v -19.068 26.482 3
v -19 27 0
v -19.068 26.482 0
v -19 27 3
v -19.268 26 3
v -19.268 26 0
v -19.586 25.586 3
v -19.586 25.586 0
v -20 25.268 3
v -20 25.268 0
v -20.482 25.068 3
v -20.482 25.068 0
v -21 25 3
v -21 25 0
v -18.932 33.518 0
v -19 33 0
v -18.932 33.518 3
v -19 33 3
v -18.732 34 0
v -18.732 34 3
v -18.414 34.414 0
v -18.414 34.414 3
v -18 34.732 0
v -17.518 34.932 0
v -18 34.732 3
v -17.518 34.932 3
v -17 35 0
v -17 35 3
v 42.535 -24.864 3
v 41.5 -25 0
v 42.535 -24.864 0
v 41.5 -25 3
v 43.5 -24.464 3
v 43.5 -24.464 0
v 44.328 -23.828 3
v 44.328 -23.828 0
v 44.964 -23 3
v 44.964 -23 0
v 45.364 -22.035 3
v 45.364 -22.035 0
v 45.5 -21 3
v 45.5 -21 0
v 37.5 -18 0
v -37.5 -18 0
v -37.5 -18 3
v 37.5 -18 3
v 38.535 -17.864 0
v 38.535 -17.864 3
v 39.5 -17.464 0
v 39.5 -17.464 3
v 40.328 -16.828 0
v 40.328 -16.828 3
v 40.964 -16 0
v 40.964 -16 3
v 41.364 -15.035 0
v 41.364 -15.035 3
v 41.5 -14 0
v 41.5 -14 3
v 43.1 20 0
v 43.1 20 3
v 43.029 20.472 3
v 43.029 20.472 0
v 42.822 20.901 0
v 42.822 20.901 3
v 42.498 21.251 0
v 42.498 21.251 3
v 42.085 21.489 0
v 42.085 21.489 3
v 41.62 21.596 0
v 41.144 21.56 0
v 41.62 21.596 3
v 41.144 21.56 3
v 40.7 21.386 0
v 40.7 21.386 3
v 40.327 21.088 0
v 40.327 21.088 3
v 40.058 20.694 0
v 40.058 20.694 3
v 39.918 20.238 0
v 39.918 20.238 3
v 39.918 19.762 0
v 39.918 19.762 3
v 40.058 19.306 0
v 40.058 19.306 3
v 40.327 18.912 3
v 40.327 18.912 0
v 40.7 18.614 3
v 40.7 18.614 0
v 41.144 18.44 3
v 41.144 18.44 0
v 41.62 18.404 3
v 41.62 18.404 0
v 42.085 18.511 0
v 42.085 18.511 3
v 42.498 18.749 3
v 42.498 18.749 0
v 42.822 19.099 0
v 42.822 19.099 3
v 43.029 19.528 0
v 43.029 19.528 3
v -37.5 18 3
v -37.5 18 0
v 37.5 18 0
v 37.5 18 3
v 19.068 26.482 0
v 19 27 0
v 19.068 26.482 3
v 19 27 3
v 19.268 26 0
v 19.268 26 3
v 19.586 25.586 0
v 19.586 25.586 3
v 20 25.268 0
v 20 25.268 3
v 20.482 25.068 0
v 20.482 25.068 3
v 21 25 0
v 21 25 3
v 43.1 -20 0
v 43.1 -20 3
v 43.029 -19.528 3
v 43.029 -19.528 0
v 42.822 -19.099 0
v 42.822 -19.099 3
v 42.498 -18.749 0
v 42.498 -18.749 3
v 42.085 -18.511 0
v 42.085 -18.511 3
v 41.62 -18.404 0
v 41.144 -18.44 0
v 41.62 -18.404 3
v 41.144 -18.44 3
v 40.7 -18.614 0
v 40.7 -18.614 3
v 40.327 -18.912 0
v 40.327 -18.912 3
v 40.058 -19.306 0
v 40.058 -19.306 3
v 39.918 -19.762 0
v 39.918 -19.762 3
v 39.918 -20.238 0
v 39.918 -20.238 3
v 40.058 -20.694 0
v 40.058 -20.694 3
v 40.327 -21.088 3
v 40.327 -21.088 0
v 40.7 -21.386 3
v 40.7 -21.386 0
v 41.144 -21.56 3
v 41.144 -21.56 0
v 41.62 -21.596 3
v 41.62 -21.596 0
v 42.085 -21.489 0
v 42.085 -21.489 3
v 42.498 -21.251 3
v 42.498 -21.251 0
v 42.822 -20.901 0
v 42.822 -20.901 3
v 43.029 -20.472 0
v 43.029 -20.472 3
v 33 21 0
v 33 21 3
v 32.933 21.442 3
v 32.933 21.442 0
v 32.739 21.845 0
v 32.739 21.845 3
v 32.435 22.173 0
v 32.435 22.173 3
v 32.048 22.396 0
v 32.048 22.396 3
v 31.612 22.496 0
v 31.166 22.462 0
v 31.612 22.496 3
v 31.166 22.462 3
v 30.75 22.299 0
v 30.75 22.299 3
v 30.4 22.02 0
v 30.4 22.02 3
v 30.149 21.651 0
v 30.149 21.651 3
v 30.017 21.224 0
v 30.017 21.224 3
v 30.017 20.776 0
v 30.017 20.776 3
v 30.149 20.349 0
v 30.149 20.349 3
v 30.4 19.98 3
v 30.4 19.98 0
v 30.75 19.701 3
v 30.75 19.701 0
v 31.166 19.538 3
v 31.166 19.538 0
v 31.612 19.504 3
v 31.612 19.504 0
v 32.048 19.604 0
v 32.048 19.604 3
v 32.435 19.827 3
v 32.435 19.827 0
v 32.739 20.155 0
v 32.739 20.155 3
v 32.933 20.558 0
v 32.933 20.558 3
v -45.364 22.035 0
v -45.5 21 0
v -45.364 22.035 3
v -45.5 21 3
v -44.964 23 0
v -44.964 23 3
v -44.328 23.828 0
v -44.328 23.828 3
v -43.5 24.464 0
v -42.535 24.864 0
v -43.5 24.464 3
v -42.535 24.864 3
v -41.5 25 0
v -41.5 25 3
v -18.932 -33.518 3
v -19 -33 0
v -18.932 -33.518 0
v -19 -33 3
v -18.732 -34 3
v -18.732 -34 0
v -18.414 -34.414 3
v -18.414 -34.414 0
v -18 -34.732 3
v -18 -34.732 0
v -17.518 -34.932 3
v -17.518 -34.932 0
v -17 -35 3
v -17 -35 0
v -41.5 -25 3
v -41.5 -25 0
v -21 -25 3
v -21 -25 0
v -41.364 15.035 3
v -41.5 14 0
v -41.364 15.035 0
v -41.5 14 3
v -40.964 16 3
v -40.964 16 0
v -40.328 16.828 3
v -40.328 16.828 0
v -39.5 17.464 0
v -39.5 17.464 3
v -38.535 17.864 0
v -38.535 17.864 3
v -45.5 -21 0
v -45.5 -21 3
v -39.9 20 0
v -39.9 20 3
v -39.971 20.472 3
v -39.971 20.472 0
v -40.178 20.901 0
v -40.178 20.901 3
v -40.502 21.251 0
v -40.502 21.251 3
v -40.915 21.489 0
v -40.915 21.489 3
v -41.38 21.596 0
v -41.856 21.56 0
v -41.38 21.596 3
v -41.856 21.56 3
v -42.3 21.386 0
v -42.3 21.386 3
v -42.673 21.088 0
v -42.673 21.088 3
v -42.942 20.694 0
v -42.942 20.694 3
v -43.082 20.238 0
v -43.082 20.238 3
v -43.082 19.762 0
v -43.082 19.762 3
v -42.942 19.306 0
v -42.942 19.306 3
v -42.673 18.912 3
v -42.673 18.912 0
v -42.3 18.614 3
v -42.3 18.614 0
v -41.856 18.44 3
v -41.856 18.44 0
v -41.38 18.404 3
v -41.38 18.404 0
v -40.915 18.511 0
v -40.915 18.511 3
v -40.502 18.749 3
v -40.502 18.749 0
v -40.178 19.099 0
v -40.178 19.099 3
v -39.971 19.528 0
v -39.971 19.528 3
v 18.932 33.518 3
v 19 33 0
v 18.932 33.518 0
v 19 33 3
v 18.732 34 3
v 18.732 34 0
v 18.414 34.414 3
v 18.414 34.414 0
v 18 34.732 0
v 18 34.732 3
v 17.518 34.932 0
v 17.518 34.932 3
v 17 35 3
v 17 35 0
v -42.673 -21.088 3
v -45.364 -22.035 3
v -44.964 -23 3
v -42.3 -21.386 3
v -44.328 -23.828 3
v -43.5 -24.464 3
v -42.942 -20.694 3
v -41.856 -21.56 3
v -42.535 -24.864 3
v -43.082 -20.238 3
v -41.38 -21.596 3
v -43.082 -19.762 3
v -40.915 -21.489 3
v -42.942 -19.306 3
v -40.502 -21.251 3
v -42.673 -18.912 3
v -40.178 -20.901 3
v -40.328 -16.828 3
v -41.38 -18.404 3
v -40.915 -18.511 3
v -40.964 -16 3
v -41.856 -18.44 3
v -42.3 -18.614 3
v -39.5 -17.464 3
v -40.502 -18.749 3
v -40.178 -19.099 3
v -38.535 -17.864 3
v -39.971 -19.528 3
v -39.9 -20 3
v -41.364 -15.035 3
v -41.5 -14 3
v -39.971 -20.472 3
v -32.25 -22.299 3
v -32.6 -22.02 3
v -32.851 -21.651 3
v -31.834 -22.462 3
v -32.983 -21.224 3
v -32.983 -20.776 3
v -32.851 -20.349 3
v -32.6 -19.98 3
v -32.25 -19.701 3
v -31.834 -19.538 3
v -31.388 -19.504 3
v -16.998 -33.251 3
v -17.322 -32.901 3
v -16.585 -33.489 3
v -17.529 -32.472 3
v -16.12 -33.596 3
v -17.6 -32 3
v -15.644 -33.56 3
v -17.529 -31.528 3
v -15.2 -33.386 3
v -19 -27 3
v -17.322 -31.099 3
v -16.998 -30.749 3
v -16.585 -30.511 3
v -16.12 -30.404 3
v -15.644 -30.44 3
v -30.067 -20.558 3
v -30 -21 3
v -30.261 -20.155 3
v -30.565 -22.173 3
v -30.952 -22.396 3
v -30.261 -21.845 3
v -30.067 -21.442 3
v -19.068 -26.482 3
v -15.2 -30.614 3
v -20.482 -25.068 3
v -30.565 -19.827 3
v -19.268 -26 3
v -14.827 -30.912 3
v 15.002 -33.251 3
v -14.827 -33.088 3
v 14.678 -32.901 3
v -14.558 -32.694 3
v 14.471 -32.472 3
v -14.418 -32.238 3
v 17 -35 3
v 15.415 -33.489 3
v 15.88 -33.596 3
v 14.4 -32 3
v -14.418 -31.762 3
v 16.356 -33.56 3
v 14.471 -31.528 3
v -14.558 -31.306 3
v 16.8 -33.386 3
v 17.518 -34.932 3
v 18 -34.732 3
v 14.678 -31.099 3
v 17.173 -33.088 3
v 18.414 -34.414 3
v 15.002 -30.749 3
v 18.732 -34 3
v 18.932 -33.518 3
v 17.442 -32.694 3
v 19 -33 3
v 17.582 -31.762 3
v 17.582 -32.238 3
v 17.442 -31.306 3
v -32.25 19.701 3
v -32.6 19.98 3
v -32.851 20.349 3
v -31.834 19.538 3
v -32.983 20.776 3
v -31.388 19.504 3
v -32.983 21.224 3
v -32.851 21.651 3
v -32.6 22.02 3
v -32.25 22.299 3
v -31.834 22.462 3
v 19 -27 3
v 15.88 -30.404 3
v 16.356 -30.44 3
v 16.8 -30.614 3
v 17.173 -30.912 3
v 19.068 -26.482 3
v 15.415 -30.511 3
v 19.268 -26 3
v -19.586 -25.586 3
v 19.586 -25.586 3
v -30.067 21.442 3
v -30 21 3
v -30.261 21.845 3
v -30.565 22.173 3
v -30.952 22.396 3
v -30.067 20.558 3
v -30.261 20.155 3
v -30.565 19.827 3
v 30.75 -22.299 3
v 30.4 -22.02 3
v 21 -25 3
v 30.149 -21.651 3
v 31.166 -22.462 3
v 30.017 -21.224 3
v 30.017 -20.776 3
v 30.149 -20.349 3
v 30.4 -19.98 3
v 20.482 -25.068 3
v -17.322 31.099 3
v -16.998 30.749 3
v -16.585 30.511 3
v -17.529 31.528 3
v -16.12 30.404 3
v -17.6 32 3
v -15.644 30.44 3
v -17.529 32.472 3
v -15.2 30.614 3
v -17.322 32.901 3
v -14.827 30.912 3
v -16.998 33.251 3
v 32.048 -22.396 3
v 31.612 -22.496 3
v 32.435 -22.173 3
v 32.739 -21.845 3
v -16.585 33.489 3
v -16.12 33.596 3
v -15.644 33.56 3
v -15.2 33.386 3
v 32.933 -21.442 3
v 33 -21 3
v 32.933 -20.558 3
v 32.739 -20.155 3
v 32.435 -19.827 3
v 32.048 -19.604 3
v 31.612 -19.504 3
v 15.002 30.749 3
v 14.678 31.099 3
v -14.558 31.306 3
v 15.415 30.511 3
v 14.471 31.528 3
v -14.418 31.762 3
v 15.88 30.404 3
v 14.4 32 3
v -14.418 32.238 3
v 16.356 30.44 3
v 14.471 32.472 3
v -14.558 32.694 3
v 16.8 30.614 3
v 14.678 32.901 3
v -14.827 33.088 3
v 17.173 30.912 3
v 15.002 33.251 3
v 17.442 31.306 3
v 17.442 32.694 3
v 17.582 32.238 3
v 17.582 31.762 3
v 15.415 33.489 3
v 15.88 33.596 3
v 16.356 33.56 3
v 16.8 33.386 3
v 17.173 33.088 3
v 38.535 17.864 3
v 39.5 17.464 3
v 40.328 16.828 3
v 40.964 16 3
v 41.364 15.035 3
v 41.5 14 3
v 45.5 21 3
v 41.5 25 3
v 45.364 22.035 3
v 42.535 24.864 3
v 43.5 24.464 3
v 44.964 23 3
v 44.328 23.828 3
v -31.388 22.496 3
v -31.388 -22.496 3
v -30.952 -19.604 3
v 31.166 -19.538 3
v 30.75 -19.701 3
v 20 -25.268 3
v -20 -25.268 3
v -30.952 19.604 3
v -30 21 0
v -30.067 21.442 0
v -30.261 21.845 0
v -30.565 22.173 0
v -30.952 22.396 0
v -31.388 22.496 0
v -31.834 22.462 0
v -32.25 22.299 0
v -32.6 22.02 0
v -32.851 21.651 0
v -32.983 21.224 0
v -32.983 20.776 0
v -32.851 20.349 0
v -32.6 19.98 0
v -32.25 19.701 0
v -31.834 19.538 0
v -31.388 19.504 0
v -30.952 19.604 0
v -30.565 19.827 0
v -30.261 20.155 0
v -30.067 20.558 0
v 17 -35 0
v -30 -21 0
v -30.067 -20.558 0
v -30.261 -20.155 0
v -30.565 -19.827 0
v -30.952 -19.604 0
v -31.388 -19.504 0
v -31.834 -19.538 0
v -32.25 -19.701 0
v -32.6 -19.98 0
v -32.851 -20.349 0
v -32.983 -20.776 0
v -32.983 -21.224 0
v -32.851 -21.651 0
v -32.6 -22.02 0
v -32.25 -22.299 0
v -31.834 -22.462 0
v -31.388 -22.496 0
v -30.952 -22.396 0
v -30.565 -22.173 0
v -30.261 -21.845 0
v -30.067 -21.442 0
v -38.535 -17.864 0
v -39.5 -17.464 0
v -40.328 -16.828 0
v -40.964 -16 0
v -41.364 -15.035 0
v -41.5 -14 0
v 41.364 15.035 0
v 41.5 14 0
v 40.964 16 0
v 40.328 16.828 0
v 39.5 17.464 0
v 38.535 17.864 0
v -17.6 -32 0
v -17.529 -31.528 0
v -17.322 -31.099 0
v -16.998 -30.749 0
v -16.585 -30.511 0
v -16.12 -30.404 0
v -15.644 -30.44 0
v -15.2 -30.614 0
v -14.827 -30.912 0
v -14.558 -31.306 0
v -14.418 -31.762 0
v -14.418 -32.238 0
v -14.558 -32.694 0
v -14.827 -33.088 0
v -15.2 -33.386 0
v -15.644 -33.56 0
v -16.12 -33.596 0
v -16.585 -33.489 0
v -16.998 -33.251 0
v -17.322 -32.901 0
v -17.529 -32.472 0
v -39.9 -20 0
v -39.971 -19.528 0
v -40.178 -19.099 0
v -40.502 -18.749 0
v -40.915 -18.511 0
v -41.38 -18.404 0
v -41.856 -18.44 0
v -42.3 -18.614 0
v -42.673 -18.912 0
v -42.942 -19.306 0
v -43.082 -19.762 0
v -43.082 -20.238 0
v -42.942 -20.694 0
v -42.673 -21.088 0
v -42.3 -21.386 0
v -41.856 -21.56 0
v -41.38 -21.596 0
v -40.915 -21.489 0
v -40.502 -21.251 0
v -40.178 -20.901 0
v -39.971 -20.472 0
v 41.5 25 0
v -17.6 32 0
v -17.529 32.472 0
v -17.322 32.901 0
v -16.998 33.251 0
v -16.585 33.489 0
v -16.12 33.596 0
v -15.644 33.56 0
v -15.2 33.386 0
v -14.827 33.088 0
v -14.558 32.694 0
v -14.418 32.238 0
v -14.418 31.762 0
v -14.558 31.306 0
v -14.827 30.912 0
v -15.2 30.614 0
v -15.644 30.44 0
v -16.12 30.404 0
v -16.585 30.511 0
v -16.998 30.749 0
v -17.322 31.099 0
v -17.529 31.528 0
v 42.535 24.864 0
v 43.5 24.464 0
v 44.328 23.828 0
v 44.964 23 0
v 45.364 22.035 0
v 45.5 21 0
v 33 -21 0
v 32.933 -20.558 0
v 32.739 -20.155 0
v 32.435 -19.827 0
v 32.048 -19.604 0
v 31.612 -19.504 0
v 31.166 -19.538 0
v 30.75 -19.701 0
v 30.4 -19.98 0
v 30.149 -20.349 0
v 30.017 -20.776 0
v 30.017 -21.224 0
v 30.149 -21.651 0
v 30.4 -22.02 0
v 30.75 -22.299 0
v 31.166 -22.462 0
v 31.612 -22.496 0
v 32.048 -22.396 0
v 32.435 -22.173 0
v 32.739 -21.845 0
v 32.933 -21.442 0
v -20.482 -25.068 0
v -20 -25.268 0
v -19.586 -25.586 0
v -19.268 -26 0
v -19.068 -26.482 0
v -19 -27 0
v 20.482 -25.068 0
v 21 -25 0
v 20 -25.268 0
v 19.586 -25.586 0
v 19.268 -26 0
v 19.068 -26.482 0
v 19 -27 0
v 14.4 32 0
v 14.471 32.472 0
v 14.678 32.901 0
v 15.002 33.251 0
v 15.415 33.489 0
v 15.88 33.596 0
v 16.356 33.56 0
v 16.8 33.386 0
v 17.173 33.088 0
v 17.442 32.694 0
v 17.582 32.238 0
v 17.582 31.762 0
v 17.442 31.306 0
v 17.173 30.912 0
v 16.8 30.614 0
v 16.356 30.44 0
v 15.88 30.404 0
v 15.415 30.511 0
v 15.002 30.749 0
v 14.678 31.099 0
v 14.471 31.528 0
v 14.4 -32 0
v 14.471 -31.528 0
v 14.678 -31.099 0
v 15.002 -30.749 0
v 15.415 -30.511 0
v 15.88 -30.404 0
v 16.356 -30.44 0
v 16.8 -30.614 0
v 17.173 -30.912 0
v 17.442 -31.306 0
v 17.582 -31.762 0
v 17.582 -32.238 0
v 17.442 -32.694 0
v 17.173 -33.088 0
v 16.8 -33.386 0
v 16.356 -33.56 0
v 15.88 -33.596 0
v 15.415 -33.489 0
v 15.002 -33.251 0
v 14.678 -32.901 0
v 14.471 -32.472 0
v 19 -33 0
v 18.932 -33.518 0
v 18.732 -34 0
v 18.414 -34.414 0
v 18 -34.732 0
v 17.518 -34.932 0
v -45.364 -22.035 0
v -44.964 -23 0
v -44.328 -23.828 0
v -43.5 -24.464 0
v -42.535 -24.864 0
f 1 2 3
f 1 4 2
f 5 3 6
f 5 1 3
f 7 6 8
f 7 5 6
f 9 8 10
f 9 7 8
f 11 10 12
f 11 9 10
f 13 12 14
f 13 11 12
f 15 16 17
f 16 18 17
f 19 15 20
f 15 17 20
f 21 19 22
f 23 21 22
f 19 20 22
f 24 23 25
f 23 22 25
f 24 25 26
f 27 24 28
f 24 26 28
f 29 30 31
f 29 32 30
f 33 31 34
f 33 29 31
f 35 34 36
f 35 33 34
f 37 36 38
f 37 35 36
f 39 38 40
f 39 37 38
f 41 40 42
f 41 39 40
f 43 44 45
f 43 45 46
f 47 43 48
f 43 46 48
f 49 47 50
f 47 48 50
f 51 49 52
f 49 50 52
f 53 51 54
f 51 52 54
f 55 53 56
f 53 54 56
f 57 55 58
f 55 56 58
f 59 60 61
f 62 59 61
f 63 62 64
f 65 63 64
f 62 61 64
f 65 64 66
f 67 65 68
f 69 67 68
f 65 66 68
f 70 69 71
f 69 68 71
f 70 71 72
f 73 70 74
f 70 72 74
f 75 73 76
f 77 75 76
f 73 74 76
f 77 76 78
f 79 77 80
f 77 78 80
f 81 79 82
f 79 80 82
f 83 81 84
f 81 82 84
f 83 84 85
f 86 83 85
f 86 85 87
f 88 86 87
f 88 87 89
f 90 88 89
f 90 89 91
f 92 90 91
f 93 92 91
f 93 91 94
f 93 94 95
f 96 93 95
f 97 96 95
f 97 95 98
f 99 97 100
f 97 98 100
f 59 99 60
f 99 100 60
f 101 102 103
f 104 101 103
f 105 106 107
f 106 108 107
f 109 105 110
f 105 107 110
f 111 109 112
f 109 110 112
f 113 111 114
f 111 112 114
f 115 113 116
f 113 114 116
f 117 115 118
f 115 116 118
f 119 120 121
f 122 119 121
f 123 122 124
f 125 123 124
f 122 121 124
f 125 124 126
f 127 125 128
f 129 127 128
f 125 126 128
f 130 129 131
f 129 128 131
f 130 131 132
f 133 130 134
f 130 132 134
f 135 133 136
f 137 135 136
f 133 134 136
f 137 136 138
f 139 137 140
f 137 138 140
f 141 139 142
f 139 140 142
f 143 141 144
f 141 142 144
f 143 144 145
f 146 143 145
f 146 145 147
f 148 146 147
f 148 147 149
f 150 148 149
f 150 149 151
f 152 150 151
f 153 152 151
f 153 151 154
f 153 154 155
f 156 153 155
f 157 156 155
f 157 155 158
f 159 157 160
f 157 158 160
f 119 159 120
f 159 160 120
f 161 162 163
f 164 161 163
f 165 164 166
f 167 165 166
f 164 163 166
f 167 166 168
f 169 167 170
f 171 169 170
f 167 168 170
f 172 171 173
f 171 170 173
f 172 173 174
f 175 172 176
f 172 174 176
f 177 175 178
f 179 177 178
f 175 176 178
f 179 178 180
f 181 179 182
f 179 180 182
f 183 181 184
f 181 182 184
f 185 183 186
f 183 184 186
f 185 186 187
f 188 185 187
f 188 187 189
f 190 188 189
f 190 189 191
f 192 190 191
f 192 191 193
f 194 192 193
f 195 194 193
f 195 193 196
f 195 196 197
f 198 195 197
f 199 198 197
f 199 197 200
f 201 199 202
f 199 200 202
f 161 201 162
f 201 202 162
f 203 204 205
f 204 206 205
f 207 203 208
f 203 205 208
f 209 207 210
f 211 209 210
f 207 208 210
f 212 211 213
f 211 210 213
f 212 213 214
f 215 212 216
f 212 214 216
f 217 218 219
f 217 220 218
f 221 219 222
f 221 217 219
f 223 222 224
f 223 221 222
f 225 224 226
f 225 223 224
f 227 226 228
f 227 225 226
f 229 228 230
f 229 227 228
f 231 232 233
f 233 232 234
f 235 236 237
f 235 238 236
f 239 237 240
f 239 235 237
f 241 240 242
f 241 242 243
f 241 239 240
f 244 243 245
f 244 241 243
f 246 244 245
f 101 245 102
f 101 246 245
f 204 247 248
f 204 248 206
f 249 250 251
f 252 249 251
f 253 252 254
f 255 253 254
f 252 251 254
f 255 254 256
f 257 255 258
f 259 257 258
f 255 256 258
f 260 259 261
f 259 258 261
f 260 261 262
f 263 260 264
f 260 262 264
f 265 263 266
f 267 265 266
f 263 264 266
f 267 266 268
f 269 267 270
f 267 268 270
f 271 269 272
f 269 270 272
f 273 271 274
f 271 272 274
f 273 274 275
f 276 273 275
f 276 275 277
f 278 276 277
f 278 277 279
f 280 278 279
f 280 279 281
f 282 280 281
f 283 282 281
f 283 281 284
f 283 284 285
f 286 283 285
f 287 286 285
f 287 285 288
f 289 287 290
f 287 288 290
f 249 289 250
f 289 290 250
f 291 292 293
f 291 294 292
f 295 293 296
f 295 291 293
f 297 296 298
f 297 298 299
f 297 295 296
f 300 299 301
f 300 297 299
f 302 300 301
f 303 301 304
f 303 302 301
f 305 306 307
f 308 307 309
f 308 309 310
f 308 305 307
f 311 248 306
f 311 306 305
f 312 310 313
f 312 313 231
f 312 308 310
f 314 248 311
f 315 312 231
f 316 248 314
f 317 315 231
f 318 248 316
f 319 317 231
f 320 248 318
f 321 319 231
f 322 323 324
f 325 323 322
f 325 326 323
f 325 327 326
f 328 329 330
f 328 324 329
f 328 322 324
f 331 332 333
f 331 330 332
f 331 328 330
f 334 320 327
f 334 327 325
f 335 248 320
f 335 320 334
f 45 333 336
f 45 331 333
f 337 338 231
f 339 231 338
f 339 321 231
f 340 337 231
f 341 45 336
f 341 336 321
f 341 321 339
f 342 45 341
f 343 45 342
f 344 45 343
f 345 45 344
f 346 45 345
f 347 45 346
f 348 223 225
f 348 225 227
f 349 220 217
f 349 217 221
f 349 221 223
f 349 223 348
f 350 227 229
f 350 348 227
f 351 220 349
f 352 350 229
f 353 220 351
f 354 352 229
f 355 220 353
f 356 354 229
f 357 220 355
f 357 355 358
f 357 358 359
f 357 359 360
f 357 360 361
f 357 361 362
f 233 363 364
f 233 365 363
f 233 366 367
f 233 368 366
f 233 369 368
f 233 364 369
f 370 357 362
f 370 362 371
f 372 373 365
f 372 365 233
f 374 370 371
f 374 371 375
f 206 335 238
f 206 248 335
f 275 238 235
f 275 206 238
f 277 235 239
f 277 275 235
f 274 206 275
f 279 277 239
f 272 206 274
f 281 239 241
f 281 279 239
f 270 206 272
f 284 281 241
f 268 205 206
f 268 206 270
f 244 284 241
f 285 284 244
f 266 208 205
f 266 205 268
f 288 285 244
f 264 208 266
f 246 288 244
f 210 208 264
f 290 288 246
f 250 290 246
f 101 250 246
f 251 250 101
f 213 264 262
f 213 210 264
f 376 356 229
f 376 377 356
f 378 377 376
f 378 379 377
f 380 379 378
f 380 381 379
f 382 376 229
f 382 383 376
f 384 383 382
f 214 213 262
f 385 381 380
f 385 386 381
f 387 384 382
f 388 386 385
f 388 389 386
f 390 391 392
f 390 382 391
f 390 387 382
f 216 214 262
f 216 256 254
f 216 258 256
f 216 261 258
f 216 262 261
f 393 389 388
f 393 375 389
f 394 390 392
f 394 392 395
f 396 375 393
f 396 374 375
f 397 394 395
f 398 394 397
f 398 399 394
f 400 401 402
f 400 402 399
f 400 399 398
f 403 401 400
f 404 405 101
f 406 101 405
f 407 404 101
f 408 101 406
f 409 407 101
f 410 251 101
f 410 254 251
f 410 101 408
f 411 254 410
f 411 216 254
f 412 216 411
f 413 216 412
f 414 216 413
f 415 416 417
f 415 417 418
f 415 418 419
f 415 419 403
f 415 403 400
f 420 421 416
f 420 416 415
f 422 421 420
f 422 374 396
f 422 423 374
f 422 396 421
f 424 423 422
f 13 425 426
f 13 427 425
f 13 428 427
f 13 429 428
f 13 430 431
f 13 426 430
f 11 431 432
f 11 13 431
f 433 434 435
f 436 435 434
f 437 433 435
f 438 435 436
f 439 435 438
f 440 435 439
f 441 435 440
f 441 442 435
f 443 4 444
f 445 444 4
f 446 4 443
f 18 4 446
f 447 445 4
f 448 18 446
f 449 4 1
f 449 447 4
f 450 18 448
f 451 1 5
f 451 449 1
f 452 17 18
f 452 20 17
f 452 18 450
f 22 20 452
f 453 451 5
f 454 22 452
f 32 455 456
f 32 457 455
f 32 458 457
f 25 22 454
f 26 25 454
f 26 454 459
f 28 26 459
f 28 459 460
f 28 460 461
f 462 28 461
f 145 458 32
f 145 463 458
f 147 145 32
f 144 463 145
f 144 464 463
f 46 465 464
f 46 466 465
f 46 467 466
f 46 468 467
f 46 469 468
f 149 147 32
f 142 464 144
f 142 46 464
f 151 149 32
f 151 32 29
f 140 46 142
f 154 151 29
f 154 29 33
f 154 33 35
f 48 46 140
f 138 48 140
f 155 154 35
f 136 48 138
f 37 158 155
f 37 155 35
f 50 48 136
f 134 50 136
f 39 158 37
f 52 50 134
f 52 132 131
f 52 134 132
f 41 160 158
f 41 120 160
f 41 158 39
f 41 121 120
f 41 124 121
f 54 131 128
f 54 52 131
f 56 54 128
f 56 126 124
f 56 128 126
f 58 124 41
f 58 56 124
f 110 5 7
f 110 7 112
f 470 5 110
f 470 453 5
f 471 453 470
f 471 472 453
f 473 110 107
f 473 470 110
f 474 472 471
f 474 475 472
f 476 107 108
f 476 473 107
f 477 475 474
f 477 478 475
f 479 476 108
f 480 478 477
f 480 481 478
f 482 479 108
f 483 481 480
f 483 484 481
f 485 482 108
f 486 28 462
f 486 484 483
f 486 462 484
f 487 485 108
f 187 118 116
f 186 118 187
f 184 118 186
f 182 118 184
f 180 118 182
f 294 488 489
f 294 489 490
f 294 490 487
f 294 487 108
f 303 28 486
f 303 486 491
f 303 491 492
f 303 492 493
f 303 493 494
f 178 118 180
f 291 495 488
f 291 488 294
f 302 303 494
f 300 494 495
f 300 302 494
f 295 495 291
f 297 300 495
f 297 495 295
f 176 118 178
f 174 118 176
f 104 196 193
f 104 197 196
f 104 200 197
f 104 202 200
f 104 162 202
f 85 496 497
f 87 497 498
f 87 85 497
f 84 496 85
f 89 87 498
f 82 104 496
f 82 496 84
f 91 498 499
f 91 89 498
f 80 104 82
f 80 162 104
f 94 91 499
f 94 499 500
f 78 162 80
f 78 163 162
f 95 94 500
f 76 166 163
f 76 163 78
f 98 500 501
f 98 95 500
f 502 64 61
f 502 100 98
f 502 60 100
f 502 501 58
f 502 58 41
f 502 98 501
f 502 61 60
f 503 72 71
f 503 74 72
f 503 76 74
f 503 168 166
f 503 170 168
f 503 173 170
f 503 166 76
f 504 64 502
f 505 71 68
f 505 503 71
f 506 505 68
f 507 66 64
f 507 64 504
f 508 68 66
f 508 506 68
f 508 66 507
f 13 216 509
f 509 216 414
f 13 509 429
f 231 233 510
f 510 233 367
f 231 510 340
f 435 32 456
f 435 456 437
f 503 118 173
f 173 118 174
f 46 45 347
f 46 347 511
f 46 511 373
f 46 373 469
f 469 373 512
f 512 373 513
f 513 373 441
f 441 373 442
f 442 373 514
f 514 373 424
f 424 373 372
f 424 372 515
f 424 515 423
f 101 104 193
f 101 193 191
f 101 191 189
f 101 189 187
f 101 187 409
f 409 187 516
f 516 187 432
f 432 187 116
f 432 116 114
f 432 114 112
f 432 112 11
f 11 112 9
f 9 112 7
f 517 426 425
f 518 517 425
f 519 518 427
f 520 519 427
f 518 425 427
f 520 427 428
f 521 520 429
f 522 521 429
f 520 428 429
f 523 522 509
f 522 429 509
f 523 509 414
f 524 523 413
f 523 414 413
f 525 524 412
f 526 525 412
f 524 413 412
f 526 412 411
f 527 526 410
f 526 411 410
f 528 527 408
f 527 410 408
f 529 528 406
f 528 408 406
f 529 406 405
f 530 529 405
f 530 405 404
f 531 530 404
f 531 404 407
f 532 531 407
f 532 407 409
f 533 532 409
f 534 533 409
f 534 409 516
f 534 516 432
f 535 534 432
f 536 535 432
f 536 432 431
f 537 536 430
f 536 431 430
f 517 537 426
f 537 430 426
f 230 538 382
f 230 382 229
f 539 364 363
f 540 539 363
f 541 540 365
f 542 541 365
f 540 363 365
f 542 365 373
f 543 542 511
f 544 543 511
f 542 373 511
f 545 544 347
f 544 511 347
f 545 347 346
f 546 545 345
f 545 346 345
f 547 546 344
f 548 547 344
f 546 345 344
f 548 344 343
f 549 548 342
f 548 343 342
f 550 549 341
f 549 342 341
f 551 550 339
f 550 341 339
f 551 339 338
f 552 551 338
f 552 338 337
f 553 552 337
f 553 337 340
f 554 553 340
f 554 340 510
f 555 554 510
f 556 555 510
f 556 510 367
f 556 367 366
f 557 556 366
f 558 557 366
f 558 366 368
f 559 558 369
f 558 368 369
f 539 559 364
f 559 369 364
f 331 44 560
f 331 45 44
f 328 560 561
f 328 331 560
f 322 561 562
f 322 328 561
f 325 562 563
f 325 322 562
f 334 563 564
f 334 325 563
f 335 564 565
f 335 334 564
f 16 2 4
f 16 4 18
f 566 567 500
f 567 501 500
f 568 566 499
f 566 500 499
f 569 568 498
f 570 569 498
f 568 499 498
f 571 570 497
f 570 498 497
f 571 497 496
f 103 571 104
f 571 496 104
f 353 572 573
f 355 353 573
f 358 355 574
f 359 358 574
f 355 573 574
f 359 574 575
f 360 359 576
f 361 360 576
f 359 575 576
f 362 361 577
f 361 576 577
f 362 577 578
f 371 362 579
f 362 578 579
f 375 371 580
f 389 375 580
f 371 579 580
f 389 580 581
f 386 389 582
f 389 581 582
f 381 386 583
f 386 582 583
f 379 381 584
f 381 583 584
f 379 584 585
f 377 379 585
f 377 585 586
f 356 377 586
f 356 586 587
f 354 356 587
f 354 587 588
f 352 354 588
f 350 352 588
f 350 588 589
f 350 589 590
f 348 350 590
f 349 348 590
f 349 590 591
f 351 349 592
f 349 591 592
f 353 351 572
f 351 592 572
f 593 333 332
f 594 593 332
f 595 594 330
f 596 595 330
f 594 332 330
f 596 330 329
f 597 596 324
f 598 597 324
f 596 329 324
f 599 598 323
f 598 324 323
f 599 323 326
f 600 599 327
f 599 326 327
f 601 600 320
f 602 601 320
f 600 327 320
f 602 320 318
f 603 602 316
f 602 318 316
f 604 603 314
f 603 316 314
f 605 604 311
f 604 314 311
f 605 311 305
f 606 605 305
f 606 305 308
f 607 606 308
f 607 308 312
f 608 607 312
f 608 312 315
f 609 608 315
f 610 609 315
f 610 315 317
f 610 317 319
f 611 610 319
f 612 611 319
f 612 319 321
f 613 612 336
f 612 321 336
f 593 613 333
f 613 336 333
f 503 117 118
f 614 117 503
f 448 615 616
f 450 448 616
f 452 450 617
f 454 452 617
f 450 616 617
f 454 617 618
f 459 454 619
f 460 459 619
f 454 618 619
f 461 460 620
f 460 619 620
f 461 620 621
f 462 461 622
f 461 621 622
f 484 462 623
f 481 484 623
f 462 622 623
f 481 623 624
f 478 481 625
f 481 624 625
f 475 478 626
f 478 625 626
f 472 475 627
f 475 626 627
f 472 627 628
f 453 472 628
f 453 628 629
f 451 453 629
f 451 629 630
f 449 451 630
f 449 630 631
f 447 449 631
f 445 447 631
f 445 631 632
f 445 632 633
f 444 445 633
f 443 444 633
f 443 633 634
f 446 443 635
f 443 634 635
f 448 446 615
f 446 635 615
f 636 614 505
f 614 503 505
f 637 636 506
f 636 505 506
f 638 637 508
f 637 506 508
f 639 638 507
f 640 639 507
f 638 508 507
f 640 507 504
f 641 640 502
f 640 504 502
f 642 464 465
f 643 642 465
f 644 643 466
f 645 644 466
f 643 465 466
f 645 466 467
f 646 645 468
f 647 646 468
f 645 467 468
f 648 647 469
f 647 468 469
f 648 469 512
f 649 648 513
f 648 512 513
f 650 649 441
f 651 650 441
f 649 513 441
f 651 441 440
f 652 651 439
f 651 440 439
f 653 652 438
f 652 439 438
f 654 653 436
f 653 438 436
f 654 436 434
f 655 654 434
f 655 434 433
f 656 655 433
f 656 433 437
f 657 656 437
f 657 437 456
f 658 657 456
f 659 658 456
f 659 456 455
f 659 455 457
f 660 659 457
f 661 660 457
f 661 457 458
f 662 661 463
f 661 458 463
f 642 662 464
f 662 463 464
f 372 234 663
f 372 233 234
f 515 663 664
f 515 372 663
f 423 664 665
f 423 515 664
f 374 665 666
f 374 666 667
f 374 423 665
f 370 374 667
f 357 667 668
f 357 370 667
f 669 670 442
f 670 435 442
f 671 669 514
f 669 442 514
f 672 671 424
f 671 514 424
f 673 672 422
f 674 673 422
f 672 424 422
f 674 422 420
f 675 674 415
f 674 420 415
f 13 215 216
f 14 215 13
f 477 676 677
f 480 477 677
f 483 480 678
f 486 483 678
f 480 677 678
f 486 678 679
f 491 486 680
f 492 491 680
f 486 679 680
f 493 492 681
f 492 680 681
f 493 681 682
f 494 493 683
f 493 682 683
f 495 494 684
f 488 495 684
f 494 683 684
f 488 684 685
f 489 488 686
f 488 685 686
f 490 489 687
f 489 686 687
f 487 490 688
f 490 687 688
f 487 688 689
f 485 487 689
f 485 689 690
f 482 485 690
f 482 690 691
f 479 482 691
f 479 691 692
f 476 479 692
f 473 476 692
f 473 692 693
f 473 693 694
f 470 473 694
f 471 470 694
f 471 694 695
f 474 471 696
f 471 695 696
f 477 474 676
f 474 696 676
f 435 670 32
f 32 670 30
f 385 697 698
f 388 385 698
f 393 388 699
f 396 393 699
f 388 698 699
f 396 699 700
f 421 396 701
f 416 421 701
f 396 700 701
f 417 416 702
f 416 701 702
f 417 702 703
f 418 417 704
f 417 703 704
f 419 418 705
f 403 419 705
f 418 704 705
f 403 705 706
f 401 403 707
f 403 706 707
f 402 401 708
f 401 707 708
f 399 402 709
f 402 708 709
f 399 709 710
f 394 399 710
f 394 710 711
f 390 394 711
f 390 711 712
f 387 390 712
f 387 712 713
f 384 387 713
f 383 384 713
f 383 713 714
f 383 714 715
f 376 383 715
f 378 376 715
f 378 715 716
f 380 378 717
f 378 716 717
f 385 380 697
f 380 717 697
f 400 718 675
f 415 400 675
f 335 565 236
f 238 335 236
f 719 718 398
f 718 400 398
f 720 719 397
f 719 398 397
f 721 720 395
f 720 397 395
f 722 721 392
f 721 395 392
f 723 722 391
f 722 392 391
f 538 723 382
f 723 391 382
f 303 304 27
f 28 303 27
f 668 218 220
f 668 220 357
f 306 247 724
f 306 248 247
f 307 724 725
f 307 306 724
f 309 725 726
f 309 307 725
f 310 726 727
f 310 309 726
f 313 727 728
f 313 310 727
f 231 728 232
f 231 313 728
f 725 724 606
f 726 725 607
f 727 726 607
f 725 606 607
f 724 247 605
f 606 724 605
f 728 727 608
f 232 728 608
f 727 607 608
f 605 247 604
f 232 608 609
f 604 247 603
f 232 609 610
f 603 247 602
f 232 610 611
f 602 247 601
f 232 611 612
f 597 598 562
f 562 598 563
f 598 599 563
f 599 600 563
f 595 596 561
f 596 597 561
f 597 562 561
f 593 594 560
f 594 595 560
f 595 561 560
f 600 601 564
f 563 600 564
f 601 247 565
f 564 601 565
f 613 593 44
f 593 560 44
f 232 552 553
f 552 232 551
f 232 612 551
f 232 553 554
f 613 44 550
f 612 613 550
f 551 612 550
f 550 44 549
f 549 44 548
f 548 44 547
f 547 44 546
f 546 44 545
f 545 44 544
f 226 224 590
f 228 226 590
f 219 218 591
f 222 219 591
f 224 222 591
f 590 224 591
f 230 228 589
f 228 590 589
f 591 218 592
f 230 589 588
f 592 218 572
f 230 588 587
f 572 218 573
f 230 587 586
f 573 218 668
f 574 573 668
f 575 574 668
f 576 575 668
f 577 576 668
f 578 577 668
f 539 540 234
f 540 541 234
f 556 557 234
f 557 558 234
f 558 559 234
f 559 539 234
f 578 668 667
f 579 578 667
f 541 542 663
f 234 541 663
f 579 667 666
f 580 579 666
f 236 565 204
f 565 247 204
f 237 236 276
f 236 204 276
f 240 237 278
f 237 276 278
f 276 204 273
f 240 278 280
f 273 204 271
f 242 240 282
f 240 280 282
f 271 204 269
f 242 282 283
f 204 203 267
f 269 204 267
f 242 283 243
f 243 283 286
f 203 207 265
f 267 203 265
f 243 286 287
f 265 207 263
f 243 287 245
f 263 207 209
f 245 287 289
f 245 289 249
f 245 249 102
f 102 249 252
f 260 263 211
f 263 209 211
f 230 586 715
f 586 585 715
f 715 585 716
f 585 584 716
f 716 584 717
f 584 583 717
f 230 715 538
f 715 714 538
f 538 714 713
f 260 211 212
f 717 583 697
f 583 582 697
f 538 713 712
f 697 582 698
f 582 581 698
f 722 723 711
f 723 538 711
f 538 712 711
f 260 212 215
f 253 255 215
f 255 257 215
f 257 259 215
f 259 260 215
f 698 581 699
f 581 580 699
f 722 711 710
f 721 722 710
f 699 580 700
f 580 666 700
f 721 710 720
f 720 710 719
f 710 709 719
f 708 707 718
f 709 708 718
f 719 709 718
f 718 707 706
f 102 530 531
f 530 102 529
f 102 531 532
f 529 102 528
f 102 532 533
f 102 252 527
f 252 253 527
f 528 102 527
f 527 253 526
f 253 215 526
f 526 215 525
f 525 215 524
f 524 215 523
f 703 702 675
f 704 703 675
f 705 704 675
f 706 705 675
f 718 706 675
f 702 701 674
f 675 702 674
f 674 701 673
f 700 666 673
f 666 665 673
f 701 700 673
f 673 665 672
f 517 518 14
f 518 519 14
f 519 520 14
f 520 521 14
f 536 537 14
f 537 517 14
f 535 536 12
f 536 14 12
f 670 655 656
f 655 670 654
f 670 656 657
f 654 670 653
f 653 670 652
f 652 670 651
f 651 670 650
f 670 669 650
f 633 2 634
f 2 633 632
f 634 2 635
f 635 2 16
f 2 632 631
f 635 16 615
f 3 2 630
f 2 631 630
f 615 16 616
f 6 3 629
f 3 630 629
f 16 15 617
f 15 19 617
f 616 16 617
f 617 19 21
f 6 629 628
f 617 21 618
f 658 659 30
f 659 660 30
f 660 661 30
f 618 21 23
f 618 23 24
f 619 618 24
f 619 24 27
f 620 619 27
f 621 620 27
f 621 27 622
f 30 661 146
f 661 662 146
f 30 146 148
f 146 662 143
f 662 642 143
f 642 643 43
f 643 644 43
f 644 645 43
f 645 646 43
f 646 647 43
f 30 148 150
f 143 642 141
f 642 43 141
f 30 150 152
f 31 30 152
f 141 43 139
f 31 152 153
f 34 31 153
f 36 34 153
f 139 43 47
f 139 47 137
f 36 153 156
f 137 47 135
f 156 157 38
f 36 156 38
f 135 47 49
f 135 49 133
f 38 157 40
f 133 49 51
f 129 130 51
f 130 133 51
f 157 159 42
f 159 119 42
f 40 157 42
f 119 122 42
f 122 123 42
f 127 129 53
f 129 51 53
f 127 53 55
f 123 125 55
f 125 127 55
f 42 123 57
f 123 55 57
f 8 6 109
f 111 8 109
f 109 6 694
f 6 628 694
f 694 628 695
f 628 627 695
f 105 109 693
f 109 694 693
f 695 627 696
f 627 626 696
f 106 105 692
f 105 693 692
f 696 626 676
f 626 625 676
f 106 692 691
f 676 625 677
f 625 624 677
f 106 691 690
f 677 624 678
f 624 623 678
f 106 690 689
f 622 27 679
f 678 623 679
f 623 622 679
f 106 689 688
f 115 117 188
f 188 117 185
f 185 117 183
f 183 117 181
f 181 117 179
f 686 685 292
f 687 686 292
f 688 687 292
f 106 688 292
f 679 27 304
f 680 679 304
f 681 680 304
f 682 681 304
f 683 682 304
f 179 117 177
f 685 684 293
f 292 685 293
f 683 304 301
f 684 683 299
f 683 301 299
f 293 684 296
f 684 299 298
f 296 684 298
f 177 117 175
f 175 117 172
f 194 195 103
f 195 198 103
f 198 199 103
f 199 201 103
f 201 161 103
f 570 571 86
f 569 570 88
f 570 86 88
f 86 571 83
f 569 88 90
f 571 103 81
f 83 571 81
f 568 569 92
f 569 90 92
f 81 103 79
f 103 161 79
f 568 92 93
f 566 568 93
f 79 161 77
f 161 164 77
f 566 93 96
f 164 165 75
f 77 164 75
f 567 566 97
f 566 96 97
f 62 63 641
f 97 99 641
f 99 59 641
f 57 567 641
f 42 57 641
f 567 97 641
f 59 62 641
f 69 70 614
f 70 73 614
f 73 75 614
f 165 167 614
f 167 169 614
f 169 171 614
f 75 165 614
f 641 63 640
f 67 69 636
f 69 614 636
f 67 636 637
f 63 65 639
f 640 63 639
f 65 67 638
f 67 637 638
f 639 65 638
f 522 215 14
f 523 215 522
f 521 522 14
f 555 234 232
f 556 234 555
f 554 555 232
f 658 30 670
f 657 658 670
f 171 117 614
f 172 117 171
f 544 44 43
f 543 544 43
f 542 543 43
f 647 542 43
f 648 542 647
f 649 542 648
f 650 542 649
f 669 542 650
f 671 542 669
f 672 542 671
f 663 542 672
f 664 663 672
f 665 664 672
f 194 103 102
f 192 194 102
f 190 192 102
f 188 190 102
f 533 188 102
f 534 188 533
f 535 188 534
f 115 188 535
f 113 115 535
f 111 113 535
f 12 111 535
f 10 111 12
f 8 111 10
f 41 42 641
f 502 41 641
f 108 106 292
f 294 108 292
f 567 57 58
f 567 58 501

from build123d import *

# Parameters (mm, degrees)
SKETCH_1_W          = 91
SKETCH_1_H          = 50
SKETCH_1_W_2        = 83
SKETCH_1_H_2        = 36
EXTRUDE_1_DEPTH     = 3
SKETCH_2_R          = 1.5
CUT_EXTRUDE_1_DEPTH = 3
SKETCH_3_R          = 1.6
CUT_EXTRUDE_2_DEPTH = 3
FILLET_1_R          = 4
SKETCH_4_W          = 30
SKETCH_4_H          = 35
EXTRUDE_2_DEPTH     = 3
SKETCH_5_R          = 1.25
CUT_EXTRUDE_3_DEPTH = 10
FILLET_2_R          = 3
SKETCH_6_W          = 18
SKETCH_6_H          = 27
CUT_EXTRUDE_4_DEPTH = 10
FILLET_3_R          = 2
SKETCH_7_W          = 38
SKETCH_7_H          = 10
SKETCH_7_R          = 1.6
EXTRUDE_3_DEPTH     = 3
FILLET_4_R          = 2
FILLET_5_R          = 2
SKETCH_8_W          = 30
SKETCH_8_H          = 41
CUT_EXTRUDE_5_DEPTH = 10


with BuildPart() as part:
    # 草图1 → 凸台-拉伸1 (new body)
    with BuildSketch(Plane.XY):
        Rectangle(SKETCH_1_W, SKETCH_1_H)
        Rectangle(SKETCH_1_W_2, SKETCH_1_H_2, mode=Mode.SUBTRACT)
    extrude(amount=EXTRUDE_1_DEPTH)

    # 草图2 → 切除-拉伸1 (cut)
    with BuildSketch(Plane.XY.offset(3)):
        with Locations((31.5, 21)):
            Circle(SKETCH_2_R)
        with Locations((31.5, -21)):
            Circle(SKETCH_2_R)
        with Locations((-31.5, -21)):
            Circle(SKETCH_2_R)
        with Locations((-31.5, 21)):
            Circle(SKETCH_2_R)
    extrude(amount=-CUT_EXTRUDE_1_DEPTH, mode=Mode.SUBTRACT)

    # 草图3 → 切除-拉伸2 (cut)
    with BuildSketch(Plane.XY.offset(3)):
        with Locations((41.5, 20)):
            Circle(SKETCH_3_R)
        with Locations((41.5, -20)):
            Circle(SKETCH_3_R)
        with Locations((-41.5, -20)):
            Circle(SKETCH_3_R)
        with Locations((-41.5, 20)):
            Circle(SKETCH_3_R)
    extrude(amount=-CUT_EXTRUDE_2_DEPTH, mode=Mode.SUBTRACT)

    # 圆角1
    fillet_1_edges = [part.edges().sort_by_distance(p)[0] for p in [
        (41.5, -18, 1.5),
        (41.5, 18, 1.5),
        (-41.5, 18, 1.5),
        (-41.5, -18, 1.5),
        (45.5, -25, 1.5),
        (-45.5, -25, 1.5),
        (-45.5, 25, 1.5),
        (45.5, 25, 1.5),
    ]]
    fillet(fillet_1_edges, radius=FILLET_1_R)

    # 草图4 → 凸台-拉伸2 (add)
    with BuildSketch(Plane(origin=(0, 0, 0), x_dir=(-1, 0, 0), z_dir=(0, 0, -1))):
        with Locations((-60.5, 0)):
            Rectangle(SKETCH_4_W, SKETCH_4_H)
    extrude(amount=-EXTRUDE_2_DEPTH)

    # 草图5 → 切除-拉伸3 (cut)
    with BuildSketch(Plane(origin=(0, 0, 0), x_dir=(-1, 0, 0), z_dir=(0, 0, -1))):
        with Locations((-70.5, -12)):
            Circle(SKETCH_5_R)
        with Locations((-70.5, 12)):
            Circle(SKETCH_5_R)
    extrude(amount=-CUT_EXTRUDE_3_DEPTH, mode=Mode.SUBTRACT)

    # 圆角2
    fillet_2_edges = [part.edges().sort_by_distance(p)[0] for p in [
        (45.5, 17.5, 1.5),
        (45.5, -17.5, 1.5),
        (75.5, -17.5, 1.5),
        (75.5, 17.5, 1.5),
    ]]
    fillet(fillet_2_edges, radius=FILLET_2_R)

    # 草图6 → 切除-拉伸4 (cut)
    with BuildSketch(Plane(origin=(0, 0, 0), x_dir=(-1, 0, 0), z_dir=(0, 0, -1))):
        with Locations((-57.5, 0)):
            Rectangle(SKETCH_6_W, SKETCH_6_H)
    extrude(amount=-CUT_EXTRUDE_4_DEPTH, mode=Mode.SUBTRACT)

    # 圆角3
    fillet_3_edges = [part.edges().sort_by_distance(p)[0] for p in [
        (66.5, -13.5, 1.5),
        (66.5, 13.5, 1.5),
        (48.5, 13.5, 1.5),
        (48.5, -13.5, 1.5),
    ]]
    fillet(fillet_3_edges, radius=FILLET_3_R)

    # 草图7 → 凸台-拉伸3 (add)
    # profile 1 of 2: a face of its own
    with BuildSketch(Plane(origin=(0, 0, 0), x_dir=(-1, 0, 0), z_dir=(0, 0, -1))):
        with Locations((0, 30)):
            Rectangle(SKETCH_7_W, SKETCH_7_H)
        with Locations((-16, 32)):
            Circle(SKETCH_7_R, mode=Mode.SUBTRACT)
        with Locations((16, 32)):
            Circle(SKETCH_7_R, mode=Mode.SUBTRACT)
    # profile 2 of 2: a face of its own
    with BuildSketch(Plane(origin=(0, 0, 0), x_dir=(-1, 0, 0), z_dir=(0, 0, -1))):
        with Locations((0, -30)):
            Rectangle(SKETCH_7_W, SKETCH_7_H)
        with Locations((16, -32)):
            Circle(SKETCH_7_R, mode=Mode.SUBTRACT)
        with Locations((-16, -32)):
            Circle(SKETCH_7_R, mode=Mode.SUBTRACT)
    extrude(amount=-EXTRUDE_3_DEPTH)

    # 圆角4
    fillet_4_edges = [part.edges().sort_by_distance(p)[0] for p in [
        (19, 35, 1.5),
        (-19, 35, 1.5),
        (-19, -35, 1.5),
        (19, -35, 1.5),
    ]]
    fillet(fillet_4_edges, radius=FILLET_4_R)

    # 圆角5
    fillet_5_edges = [part.edges().sort_by_distance(p)[0] for p in [
        (19, 25, 1.5),
        (-19, 25, 1.5),
        (-19, -25, 1.5),
        (19, -25, 1.5),
    ]]
    fillet(fillet_5_edges, radius=FILLET_5_R)

    # 草图8 → 切除-拉伸5 (cut)
    with BuildSketch(Plane.XY.offset(3)):
        with Locations((60.5, 0)):
            Rectangle(SKETCH_8_W, SKETCH_8_H)
    extrude(amount=-CUT_EXTRUDE_5_DEPTH, mode=Mode.SUBTRACT)


solid = part.part
